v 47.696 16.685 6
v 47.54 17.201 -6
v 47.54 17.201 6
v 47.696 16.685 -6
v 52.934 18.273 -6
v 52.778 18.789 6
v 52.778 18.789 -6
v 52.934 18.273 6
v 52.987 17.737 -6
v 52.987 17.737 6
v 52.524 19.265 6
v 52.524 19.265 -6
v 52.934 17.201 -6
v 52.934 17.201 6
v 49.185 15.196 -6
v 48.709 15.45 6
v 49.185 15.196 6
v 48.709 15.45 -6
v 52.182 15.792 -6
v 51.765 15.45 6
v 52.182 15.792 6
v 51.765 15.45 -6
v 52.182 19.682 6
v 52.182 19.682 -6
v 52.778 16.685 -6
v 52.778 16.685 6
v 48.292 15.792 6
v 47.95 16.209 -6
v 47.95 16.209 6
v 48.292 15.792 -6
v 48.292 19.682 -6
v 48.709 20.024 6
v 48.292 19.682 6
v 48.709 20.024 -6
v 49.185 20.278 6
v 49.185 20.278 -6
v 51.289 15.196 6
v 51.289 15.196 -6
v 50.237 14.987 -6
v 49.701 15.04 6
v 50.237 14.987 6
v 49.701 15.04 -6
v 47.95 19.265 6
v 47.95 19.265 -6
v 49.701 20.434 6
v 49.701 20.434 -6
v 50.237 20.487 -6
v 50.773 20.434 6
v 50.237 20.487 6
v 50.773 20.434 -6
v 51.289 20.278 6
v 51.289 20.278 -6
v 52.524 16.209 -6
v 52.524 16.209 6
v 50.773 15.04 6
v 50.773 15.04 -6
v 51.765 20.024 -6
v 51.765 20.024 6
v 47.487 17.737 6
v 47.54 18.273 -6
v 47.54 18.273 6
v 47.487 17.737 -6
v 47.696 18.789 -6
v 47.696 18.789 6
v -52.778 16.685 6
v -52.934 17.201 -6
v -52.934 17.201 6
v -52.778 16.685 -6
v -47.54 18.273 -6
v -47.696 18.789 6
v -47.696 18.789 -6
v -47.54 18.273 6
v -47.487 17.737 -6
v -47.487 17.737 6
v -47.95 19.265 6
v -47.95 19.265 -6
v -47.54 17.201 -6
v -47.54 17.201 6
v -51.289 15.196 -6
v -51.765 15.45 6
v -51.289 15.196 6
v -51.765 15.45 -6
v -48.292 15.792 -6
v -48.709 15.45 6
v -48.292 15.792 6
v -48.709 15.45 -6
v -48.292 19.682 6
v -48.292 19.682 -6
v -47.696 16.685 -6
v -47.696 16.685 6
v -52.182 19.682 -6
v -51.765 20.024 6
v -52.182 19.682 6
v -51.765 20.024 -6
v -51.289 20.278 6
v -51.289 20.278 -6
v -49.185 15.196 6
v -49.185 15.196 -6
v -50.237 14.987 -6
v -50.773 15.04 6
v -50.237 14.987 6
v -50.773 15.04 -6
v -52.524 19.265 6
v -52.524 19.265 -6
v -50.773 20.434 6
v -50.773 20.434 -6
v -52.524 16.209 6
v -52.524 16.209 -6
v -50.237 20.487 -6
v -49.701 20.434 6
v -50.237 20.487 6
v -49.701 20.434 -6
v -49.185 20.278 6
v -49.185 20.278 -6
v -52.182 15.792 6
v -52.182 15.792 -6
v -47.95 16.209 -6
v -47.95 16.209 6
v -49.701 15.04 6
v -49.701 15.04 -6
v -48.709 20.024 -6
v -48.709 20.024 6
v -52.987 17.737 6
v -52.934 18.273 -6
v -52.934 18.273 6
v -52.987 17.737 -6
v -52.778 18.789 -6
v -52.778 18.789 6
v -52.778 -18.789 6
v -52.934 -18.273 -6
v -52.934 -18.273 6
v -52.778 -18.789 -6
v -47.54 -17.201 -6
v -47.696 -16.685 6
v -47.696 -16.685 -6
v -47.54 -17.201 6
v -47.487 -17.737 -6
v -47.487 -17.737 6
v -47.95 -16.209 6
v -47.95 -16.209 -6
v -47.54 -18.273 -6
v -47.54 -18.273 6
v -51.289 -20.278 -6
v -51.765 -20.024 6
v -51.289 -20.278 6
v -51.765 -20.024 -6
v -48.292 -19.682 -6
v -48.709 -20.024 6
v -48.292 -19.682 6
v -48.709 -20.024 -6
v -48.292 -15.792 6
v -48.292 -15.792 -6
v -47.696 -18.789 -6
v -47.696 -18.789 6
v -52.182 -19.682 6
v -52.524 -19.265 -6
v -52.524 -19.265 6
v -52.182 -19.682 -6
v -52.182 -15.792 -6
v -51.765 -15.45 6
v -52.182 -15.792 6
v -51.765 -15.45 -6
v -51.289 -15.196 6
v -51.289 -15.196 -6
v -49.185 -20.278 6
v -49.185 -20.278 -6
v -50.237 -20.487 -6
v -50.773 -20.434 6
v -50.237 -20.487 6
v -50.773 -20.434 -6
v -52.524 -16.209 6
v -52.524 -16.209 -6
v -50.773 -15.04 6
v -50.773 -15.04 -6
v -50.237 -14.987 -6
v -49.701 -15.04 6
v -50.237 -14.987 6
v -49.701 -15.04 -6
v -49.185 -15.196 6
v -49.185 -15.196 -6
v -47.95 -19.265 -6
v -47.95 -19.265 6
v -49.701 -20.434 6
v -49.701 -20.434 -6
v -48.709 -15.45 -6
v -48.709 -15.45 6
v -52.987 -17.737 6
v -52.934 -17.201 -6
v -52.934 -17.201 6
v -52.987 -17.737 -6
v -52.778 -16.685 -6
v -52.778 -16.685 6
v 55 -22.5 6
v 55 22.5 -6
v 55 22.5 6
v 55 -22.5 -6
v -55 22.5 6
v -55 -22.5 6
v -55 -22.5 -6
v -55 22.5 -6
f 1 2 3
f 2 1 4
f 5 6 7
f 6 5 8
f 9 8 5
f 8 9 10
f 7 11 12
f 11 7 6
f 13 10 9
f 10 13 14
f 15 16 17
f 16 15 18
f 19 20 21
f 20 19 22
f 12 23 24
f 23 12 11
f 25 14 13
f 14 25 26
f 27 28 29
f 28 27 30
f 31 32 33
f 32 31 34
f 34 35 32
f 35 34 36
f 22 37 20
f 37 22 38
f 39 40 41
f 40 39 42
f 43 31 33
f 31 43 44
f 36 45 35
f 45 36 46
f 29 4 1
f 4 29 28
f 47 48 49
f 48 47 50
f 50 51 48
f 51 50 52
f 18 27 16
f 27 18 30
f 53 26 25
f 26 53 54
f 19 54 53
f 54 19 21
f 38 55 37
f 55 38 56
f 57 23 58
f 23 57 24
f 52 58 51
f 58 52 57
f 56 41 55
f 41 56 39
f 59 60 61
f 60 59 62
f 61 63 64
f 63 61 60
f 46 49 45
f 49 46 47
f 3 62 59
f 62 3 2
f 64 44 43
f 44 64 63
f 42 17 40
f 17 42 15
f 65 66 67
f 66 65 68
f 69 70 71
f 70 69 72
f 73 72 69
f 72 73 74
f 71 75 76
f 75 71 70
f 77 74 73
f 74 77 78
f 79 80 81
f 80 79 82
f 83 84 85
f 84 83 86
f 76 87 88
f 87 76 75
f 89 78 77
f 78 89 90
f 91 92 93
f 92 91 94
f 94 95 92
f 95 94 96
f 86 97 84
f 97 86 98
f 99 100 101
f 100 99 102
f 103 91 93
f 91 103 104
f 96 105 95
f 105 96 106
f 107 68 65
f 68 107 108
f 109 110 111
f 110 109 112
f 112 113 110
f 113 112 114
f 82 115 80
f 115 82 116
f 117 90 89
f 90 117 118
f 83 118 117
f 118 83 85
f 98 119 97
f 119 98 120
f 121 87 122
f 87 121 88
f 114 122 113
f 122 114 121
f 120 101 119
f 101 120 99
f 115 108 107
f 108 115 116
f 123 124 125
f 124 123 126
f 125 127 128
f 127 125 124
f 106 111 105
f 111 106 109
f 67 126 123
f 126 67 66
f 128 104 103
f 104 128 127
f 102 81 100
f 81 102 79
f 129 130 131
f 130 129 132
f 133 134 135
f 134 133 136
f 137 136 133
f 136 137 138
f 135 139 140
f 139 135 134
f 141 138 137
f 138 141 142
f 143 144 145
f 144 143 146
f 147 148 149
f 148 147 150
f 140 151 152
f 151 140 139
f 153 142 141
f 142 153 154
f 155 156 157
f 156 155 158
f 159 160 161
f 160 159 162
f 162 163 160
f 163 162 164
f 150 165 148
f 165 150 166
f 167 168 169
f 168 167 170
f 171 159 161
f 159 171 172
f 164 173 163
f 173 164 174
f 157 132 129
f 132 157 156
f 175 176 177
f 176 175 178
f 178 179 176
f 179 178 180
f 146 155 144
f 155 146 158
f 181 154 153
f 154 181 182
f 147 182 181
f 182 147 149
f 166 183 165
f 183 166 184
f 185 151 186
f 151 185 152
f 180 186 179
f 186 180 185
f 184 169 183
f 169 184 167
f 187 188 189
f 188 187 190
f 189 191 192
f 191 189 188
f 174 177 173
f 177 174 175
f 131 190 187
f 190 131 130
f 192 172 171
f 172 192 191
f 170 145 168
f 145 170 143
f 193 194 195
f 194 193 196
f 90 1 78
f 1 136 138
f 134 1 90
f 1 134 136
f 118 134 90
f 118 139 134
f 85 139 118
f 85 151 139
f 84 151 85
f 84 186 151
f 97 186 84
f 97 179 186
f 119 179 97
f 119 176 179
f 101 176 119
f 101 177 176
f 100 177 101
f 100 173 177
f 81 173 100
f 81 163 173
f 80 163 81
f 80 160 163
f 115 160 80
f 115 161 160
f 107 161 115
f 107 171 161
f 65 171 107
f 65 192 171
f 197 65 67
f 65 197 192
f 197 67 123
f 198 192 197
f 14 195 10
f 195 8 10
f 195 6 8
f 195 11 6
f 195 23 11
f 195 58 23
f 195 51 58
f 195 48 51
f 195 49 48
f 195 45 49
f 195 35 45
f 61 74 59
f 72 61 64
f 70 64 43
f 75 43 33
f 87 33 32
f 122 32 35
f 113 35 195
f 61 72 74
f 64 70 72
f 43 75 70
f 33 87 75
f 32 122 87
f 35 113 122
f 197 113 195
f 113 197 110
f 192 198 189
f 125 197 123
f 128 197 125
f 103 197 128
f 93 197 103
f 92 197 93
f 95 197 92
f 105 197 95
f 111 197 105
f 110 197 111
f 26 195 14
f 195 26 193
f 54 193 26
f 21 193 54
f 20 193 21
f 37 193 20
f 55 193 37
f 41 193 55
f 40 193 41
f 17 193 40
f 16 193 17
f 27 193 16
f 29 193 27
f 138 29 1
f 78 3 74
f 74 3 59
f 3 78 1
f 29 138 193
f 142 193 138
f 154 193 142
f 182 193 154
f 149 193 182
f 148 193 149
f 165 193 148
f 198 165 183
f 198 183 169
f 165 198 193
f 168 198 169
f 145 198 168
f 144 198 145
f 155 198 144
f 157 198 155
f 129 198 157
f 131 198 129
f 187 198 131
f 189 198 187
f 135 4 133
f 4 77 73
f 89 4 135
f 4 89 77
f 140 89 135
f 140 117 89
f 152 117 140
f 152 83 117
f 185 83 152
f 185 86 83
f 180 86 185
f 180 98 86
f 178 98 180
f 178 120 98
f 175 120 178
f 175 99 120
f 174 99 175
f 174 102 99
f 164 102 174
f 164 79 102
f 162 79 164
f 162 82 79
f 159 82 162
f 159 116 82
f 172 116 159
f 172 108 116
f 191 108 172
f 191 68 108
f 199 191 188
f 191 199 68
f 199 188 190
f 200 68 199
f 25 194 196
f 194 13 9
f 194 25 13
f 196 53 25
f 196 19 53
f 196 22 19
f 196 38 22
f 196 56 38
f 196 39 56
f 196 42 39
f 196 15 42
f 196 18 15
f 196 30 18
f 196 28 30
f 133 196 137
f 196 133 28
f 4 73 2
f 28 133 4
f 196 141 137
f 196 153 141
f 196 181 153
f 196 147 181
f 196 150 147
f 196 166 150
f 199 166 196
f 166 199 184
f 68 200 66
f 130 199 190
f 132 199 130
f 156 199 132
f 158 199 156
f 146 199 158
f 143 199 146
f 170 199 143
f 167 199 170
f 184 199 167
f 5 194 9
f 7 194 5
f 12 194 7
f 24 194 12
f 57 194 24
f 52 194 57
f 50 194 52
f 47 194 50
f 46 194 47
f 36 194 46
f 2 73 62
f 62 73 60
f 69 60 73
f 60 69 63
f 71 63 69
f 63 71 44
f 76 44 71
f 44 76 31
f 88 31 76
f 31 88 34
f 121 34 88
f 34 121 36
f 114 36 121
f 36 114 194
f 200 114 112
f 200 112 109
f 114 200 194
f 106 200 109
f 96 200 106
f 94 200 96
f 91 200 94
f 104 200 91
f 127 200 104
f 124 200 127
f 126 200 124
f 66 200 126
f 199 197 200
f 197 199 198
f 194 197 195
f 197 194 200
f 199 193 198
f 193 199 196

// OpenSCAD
$fn = 32;

// ----------------------------------------------------------------------
// Corner plate 110 x 45 x 12
// 3 holes, centres taken from the edge offset
// ----------------------------------------------------------------------

// --- parameters (mm) ---
plate = [110, 45, 12];  // overall size (x, y, z)
holes = 3;              // number of holes the drawing asks for
hole_d = 5.5;           // hole diameter
edge = 4.763;           // hole centre offset from the plate edge

// --- derived feature positions (mm) ---
corner_x = plate[0] / 2 - edge;  // = 50.24   corner hole X
corner_y = plate[1] / 2 - edge;  // = 17.74   corner hole Y
feature_centers = [
  [corner_x, corner_y],
  [-corner_x, corner_y],
  [-corner_x, -corner_y]
];   // hole centres the loop below drills

// plate outline, every hole drilled through with the same cutters
difference() {
  cube(plate, center = true);
  for (centre = feature_centers)
    translate([centre[0], centre[1], 0])
      cylinder(d = hole_d, h = plate[2] + 2, center = true);
}
